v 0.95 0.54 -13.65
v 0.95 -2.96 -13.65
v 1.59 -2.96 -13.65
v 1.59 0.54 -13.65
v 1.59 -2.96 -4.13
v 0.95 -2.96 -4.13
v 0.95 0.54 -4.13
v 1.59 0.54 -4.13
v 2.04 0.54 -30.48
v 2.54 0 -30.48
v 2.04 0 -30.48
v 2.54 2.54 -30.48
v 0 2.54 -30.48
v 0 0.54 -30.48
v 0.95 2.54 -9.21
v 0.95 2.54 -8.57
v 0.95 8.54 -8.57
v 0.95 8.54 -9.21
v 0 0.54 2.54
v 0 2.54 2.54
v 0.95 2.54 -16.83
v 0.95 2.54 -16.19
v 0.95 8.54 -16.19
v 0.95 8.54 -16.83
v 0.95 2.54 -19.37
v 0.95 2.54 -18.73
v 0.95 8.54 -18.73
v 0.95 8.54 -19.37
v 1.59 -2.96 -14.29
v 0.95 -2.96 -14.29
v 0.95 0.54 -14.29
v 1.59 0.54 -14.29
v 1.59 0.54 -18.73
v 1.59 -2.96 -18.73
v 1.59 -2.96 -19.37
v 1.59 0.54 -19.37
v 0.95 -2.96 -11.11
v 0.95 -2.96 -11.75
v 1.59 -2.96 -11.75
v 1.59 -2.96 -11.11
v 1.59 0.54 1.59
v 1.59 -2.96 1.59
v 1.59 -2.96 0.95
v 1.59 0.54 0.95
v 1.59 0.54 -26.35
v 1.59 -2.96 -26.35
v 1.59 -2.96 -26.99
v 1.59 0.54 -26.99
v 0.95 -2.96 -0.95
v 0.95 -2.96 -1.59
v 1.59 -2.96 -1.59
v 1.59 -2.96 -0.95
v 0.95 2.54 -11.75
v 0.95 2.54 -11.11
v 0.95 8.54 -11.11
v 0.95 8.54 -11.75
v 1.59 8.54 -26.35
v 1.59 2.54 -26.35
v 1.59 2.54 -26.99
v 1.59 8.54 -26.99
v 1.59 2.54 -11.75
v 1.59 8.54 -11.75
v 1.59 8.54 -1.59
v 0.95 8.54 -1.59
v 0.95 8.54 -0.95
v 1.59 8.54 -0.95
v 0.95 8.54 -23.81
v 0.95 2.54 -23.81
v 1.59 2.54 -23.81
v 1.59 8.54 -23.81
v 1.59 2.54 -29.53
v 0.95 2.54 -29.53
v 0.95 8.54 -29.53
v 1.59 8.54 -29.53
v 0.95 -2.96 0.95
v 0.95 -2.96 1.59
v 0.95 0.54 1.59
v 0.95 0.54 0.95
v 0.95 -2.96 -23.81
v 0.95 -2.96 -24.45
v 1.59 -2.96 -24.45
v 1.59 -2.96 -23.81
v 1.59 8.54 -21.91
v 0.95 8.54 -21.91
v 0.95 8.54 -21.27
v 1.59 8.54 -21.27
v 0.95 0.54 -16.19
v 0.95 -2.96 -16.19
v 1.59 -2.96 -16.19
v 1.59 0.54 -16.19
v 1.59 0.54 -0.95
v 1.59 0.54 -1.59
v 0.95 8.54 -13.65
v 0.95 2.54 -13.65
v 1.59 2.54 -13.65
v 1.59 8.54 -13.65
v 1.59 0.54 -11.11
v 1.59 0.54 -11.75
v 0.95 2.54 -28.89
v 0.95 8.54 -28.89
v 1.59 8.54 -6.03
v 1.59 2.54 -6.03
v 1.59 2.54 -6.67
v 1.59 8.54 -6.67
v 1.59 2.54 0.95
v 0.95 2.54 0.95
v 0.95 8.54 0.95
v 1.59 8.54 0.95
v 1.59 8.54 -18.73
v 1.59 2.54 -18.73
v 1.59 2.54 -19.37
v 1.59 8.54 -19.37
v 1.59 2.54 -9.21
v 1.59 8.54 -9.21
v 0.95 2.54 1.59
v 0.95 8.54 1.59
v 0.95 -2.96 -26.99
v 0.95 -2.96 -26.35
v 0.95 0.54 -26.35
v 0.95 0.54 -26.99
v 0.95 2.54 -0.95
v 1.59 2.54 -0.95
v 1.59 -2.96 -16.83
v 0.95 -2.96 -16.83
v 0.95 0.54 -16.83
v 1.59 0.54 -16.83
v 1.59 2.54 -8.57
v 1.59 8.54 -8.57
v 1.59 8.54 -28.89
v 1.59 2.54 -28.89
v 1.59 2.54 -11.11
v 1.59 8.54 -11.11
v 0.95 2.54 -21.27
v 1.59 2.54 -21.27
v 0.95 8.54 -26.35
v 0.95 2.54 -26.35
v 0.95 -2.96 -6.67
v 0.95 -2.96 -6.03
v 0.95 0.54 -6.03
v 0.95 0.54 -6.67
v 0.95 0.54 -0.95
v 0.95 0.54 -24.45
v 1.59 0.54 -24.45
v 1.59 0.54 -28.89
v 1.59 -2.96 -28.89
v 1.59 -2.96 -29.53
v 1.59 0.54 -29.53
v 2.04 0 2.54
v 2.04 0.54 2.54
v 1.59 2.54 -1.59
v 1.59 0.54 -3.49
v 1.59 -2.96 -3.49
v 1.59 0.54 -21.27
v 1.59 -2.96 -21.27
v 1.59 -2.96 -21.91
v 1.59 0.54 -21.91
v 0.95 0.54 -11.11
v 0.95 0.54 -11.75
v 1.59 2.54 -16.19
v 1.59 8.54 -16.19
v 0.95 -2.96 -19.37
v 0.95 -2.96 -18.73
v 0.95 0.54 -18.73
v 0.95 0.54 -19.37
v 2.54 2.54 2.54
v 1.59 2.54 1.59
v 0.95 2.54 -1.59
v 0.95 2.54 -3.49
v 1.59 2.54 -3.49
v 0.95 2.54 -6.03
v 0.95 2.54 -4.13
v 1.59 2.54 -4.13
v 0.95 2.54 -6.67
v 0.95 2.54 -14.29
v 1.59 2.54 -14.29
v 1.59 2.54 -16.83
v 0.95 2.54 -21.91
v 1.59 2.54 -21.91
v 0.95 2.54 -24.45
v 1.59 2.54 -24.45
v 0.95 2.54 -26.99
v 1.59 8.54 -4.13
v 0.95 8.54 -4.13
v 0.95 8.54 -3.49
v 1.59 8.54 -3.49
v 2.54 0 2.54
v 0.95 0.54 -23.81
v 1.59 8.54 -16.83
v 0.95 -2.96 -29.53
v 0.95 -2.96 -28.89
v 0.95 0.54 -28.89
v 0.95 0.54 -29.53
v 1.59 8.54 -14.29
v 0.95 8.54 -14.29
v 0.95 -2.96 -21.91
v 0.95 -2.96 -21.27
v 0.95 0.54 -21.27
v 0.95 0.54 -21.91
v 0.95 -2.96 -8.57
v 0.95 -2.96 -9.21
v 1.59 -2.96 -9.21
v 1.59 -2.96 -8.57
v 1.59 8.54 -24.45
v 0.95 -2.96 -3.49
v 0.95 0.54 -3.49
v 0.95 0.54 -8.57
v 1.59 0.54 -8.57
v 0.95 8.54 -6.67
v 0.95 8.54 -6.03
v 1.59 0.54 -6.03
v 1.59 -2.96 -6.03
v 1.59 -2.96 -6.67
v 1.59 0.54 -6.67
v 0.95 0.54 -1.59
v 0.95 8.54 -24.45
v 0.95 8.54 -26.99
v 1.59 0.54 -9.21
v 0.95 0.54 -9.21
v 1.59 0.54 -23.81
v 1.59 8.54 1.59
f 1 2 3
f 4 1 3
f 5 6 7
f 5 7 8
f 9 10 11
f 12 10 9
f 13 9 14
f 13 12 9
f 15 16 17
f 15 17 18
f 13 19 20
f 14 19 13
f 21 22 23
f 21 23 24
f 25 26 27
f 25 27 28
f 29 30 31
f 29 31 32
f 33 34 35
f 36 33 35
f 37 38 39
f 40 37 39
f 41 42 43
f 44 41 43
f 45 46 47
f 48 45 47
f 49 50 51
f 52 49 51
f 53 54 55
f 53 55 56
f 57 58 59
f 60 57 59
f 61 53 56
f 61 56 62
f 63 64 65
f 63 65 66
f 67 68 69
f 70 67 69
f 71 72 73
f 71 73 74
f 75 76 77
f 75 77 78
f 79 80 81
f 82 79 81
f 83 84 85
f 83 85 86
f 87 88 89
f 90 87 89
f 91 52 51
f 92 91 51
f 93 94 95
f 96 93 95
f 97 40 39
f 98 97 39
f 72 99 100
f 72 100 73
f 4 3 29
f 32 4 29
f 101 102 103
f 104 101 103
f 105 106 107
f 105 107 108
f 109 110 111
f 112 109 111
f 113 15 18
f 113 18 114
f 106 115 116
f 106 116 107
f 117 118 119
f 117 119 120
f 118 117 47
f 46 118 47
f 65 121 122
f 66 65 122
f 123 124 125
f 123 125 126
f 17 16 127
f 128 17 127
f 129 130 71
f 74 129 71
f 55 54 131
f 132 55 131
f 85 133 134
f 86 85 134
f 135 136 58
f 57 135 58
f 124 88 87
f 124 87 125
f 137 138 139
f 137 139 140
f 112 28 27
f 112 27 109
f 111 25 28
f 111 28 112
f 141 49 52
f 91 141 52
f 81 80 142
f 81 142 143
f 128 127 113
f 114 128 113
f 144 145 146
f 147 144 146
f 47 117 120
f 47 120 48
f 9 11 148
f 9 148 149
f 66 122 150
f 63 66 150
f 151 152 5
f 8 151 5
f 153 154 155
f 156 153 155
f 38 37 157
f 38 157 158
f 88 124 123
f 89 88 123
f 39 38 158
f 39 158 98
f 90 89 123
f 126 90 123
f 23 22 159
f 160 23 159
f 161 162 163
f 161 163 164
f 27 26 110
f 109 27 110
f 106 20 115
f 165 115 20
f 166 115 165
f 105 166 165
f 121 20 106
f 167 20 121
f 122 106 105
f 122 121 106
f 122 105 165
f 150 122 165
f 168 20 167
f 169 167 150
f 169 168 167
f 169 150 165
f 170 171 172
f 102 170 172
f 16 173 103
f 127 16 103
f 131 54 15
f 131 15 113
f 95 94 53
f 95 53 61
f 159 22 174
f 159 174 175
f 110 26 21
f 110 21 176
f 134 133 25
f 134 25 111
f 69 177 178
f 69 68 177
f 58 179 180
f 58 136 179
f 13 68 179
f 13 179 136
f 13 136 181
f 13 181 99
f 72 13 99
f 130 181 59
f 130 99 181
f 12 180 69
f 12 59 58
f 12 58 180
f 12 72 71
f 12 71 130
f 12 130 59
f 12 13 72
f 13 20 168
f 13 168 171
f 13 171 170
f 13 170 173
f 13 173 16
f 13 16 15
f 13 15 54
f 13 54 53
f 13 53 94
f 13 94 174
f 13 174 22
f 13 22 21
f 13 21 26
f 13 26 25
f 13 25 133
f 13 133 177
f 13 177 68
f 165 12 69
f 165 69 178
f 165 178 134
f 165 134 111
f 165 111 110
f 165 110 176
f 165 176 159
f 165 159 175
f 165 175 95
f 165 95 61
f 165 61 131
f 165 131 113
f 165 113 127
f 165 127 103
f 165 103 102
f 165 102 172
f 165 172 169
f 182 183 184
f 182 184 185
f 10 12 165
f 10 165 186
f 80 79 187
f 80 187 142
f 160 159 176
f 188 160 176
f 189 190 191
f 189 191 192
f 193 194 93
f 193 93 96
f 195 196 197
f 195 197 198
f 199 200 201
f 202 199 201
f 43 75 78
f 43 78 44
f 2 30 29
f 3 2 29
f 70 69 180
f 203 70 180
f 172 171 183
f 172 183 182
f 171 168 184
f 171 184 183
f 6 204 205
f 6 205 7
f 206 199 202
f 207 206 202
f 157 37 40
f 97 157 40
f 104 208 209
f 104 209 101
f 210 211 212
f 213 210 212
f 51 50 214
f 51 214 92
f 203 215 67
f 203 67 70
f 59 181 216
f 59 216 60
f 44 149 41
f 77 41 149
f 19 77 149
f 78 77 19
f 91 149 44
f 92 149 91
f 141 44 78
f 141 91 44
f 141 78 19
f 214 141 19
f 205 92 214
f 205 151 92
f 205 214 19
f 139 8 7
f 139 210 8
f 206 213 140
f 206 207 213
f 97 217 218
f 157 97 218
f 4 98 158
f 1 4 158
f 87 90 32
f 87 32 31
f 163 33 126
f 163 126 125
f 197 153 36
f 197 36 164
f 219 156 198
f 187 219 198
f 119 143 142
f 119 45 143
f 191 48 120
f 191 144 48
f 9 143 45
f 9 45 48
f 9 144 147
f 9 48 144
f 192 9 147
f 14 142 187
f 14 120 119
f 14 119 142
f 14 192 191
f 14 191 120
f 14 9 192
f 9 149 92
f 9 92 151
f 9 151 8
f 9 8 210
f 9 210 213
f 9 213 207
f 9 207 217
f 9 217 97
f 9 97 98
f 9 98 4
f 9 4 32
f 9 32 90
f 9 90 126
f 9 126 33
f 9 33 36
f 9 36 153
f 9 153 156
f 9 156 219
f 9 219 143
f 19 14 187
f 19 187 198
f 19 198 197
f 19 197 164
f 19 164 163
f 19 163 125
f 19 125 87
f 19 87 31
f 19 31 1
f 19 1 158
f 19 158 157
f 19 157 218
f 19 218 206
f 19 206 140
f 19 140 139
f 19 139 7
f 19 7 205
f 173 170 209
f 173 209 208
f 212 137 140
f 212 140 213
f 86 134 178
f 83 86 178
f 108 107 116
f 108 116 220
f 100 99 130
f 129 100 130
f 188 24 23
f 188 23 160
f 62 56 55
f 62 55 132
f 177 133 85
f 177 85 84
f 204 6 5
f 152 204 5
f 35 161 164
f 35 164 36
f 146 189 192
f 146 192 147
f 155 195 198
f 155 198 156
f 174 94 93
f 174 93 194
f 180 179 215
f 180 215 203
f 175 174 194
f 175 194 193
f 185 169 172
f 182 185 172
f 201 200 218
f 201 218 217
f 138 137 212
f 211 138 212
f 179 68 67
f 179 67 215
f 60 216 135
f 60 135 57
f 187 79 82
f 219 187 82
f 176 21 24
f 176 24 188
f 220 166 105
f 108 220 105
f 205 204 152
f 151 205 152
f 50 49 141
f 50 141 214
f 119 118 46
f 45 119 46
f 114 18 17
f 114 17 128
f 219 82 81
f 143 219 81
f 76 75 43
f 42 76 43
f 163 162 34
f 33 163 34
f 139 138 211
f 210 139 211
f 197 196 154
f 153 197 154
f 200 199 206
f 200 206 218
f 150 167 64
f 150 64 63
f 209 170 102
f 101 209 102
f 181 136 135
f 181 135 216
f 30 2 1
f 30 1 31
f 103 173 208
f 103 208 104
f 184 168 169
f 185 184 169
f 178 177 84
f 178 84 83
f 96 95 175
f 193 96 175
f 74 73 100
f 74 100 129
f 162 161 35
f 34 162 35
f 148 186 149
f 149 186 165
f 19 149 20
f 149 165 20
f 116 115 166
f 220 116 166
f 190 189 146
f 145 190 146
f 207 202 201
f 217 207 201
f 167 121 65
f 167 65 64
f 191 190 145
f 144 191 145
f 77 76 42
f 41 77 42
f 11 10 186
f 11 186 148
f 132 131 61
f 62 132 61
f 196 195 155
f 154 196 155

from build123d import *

# Parameters (mm, degrees)
EXTRUDE_1_DEPTH            = 2.54
EXTRUDE_START              = -5.5
SKETCH_2_W                 = 0.64
SKETCH_2_H                 = 0.64
EXTRUDE_2_DEPTH            = 11.5
PATTERN_LINEAR_27_COUNT    = 13
PATTERN_LINEAR_27_PITCH    = 2.54
CROQUIS1_W                 = 6.114803871
CROQUIS1_H                 = 33.02
CORTAR_EXTRUIR1_DEPTH      = 9.54
CORTAR_EXTRUIR1_DEPTH_BACK = 3.96


with BuildPart() as part:
    # Эскиз1 → Бобышка-Вытянуть1 (new body)
    with BuildSketch(Plane.XY):
        Polygon((-2.54, 0), (-2.54, 2.54), (2.54, 2.54), (2.54, 0), (2.04, 0), (2.04, 0.54), (-2.04, 0.54), (-2.04, 0), align=None)
    extrude_1 = extrude(amount=EXTRUDE_1_DEPTH)

    # Эскиз2 → Бобышка-Вытянуть2 (add)
    with BuildSketch(Plane(origin=(0, 2.54, 0), x_dir=(1, 0, 0), z_dir=(0, 1, 0)).offset(EXTRUDE_START)):
        with Locations((-1.27, -1.27)):
            Rectangle(SKETCH_2_W, SKETCH_2_H)
        with Locations((1.27, -1.27)):
            Rectangle(SKETCH_2_W, SKETCH_2_H)
    extrude_2 = extrude(amount=EXTRUDE_2_DEPTH)

    # Линейный массив27: Бобышка-Вытянуть1, Бобышка-Вытянуть2 ×13
    with Locations(*[(0, 0, -i * PATTERN_LINEAR_27_PITCH) for i in range(1, PATTERN_LINEAR_27_COUNT)]):
        add(extrude_1)
        add(extrude_2)

    # Croquis1 → Cortar-Extruir1 (cut, two sides)
    with BuildSketch(Plane(origin=(0, 0, 0), x_dir=(1, 0, 0), z_dir=(0, 1, 0))) as cortar_extruir1_sk:
        with Locations((-3.057401936, 13.97)):
            Rectangle(CROQUIS1_W, CROQUIS1_H)
    extrude(amount=CORTAR_EXTRUIR1_DEPTH, mode=Mode.SUBTRACT)
    extrude(cortar_extruir1_sk.sketch, amount=-CORTAR_EXTRUIR1_DEPTH_BACK, mode=Mode.SUBTRACT)


solid = part.part
